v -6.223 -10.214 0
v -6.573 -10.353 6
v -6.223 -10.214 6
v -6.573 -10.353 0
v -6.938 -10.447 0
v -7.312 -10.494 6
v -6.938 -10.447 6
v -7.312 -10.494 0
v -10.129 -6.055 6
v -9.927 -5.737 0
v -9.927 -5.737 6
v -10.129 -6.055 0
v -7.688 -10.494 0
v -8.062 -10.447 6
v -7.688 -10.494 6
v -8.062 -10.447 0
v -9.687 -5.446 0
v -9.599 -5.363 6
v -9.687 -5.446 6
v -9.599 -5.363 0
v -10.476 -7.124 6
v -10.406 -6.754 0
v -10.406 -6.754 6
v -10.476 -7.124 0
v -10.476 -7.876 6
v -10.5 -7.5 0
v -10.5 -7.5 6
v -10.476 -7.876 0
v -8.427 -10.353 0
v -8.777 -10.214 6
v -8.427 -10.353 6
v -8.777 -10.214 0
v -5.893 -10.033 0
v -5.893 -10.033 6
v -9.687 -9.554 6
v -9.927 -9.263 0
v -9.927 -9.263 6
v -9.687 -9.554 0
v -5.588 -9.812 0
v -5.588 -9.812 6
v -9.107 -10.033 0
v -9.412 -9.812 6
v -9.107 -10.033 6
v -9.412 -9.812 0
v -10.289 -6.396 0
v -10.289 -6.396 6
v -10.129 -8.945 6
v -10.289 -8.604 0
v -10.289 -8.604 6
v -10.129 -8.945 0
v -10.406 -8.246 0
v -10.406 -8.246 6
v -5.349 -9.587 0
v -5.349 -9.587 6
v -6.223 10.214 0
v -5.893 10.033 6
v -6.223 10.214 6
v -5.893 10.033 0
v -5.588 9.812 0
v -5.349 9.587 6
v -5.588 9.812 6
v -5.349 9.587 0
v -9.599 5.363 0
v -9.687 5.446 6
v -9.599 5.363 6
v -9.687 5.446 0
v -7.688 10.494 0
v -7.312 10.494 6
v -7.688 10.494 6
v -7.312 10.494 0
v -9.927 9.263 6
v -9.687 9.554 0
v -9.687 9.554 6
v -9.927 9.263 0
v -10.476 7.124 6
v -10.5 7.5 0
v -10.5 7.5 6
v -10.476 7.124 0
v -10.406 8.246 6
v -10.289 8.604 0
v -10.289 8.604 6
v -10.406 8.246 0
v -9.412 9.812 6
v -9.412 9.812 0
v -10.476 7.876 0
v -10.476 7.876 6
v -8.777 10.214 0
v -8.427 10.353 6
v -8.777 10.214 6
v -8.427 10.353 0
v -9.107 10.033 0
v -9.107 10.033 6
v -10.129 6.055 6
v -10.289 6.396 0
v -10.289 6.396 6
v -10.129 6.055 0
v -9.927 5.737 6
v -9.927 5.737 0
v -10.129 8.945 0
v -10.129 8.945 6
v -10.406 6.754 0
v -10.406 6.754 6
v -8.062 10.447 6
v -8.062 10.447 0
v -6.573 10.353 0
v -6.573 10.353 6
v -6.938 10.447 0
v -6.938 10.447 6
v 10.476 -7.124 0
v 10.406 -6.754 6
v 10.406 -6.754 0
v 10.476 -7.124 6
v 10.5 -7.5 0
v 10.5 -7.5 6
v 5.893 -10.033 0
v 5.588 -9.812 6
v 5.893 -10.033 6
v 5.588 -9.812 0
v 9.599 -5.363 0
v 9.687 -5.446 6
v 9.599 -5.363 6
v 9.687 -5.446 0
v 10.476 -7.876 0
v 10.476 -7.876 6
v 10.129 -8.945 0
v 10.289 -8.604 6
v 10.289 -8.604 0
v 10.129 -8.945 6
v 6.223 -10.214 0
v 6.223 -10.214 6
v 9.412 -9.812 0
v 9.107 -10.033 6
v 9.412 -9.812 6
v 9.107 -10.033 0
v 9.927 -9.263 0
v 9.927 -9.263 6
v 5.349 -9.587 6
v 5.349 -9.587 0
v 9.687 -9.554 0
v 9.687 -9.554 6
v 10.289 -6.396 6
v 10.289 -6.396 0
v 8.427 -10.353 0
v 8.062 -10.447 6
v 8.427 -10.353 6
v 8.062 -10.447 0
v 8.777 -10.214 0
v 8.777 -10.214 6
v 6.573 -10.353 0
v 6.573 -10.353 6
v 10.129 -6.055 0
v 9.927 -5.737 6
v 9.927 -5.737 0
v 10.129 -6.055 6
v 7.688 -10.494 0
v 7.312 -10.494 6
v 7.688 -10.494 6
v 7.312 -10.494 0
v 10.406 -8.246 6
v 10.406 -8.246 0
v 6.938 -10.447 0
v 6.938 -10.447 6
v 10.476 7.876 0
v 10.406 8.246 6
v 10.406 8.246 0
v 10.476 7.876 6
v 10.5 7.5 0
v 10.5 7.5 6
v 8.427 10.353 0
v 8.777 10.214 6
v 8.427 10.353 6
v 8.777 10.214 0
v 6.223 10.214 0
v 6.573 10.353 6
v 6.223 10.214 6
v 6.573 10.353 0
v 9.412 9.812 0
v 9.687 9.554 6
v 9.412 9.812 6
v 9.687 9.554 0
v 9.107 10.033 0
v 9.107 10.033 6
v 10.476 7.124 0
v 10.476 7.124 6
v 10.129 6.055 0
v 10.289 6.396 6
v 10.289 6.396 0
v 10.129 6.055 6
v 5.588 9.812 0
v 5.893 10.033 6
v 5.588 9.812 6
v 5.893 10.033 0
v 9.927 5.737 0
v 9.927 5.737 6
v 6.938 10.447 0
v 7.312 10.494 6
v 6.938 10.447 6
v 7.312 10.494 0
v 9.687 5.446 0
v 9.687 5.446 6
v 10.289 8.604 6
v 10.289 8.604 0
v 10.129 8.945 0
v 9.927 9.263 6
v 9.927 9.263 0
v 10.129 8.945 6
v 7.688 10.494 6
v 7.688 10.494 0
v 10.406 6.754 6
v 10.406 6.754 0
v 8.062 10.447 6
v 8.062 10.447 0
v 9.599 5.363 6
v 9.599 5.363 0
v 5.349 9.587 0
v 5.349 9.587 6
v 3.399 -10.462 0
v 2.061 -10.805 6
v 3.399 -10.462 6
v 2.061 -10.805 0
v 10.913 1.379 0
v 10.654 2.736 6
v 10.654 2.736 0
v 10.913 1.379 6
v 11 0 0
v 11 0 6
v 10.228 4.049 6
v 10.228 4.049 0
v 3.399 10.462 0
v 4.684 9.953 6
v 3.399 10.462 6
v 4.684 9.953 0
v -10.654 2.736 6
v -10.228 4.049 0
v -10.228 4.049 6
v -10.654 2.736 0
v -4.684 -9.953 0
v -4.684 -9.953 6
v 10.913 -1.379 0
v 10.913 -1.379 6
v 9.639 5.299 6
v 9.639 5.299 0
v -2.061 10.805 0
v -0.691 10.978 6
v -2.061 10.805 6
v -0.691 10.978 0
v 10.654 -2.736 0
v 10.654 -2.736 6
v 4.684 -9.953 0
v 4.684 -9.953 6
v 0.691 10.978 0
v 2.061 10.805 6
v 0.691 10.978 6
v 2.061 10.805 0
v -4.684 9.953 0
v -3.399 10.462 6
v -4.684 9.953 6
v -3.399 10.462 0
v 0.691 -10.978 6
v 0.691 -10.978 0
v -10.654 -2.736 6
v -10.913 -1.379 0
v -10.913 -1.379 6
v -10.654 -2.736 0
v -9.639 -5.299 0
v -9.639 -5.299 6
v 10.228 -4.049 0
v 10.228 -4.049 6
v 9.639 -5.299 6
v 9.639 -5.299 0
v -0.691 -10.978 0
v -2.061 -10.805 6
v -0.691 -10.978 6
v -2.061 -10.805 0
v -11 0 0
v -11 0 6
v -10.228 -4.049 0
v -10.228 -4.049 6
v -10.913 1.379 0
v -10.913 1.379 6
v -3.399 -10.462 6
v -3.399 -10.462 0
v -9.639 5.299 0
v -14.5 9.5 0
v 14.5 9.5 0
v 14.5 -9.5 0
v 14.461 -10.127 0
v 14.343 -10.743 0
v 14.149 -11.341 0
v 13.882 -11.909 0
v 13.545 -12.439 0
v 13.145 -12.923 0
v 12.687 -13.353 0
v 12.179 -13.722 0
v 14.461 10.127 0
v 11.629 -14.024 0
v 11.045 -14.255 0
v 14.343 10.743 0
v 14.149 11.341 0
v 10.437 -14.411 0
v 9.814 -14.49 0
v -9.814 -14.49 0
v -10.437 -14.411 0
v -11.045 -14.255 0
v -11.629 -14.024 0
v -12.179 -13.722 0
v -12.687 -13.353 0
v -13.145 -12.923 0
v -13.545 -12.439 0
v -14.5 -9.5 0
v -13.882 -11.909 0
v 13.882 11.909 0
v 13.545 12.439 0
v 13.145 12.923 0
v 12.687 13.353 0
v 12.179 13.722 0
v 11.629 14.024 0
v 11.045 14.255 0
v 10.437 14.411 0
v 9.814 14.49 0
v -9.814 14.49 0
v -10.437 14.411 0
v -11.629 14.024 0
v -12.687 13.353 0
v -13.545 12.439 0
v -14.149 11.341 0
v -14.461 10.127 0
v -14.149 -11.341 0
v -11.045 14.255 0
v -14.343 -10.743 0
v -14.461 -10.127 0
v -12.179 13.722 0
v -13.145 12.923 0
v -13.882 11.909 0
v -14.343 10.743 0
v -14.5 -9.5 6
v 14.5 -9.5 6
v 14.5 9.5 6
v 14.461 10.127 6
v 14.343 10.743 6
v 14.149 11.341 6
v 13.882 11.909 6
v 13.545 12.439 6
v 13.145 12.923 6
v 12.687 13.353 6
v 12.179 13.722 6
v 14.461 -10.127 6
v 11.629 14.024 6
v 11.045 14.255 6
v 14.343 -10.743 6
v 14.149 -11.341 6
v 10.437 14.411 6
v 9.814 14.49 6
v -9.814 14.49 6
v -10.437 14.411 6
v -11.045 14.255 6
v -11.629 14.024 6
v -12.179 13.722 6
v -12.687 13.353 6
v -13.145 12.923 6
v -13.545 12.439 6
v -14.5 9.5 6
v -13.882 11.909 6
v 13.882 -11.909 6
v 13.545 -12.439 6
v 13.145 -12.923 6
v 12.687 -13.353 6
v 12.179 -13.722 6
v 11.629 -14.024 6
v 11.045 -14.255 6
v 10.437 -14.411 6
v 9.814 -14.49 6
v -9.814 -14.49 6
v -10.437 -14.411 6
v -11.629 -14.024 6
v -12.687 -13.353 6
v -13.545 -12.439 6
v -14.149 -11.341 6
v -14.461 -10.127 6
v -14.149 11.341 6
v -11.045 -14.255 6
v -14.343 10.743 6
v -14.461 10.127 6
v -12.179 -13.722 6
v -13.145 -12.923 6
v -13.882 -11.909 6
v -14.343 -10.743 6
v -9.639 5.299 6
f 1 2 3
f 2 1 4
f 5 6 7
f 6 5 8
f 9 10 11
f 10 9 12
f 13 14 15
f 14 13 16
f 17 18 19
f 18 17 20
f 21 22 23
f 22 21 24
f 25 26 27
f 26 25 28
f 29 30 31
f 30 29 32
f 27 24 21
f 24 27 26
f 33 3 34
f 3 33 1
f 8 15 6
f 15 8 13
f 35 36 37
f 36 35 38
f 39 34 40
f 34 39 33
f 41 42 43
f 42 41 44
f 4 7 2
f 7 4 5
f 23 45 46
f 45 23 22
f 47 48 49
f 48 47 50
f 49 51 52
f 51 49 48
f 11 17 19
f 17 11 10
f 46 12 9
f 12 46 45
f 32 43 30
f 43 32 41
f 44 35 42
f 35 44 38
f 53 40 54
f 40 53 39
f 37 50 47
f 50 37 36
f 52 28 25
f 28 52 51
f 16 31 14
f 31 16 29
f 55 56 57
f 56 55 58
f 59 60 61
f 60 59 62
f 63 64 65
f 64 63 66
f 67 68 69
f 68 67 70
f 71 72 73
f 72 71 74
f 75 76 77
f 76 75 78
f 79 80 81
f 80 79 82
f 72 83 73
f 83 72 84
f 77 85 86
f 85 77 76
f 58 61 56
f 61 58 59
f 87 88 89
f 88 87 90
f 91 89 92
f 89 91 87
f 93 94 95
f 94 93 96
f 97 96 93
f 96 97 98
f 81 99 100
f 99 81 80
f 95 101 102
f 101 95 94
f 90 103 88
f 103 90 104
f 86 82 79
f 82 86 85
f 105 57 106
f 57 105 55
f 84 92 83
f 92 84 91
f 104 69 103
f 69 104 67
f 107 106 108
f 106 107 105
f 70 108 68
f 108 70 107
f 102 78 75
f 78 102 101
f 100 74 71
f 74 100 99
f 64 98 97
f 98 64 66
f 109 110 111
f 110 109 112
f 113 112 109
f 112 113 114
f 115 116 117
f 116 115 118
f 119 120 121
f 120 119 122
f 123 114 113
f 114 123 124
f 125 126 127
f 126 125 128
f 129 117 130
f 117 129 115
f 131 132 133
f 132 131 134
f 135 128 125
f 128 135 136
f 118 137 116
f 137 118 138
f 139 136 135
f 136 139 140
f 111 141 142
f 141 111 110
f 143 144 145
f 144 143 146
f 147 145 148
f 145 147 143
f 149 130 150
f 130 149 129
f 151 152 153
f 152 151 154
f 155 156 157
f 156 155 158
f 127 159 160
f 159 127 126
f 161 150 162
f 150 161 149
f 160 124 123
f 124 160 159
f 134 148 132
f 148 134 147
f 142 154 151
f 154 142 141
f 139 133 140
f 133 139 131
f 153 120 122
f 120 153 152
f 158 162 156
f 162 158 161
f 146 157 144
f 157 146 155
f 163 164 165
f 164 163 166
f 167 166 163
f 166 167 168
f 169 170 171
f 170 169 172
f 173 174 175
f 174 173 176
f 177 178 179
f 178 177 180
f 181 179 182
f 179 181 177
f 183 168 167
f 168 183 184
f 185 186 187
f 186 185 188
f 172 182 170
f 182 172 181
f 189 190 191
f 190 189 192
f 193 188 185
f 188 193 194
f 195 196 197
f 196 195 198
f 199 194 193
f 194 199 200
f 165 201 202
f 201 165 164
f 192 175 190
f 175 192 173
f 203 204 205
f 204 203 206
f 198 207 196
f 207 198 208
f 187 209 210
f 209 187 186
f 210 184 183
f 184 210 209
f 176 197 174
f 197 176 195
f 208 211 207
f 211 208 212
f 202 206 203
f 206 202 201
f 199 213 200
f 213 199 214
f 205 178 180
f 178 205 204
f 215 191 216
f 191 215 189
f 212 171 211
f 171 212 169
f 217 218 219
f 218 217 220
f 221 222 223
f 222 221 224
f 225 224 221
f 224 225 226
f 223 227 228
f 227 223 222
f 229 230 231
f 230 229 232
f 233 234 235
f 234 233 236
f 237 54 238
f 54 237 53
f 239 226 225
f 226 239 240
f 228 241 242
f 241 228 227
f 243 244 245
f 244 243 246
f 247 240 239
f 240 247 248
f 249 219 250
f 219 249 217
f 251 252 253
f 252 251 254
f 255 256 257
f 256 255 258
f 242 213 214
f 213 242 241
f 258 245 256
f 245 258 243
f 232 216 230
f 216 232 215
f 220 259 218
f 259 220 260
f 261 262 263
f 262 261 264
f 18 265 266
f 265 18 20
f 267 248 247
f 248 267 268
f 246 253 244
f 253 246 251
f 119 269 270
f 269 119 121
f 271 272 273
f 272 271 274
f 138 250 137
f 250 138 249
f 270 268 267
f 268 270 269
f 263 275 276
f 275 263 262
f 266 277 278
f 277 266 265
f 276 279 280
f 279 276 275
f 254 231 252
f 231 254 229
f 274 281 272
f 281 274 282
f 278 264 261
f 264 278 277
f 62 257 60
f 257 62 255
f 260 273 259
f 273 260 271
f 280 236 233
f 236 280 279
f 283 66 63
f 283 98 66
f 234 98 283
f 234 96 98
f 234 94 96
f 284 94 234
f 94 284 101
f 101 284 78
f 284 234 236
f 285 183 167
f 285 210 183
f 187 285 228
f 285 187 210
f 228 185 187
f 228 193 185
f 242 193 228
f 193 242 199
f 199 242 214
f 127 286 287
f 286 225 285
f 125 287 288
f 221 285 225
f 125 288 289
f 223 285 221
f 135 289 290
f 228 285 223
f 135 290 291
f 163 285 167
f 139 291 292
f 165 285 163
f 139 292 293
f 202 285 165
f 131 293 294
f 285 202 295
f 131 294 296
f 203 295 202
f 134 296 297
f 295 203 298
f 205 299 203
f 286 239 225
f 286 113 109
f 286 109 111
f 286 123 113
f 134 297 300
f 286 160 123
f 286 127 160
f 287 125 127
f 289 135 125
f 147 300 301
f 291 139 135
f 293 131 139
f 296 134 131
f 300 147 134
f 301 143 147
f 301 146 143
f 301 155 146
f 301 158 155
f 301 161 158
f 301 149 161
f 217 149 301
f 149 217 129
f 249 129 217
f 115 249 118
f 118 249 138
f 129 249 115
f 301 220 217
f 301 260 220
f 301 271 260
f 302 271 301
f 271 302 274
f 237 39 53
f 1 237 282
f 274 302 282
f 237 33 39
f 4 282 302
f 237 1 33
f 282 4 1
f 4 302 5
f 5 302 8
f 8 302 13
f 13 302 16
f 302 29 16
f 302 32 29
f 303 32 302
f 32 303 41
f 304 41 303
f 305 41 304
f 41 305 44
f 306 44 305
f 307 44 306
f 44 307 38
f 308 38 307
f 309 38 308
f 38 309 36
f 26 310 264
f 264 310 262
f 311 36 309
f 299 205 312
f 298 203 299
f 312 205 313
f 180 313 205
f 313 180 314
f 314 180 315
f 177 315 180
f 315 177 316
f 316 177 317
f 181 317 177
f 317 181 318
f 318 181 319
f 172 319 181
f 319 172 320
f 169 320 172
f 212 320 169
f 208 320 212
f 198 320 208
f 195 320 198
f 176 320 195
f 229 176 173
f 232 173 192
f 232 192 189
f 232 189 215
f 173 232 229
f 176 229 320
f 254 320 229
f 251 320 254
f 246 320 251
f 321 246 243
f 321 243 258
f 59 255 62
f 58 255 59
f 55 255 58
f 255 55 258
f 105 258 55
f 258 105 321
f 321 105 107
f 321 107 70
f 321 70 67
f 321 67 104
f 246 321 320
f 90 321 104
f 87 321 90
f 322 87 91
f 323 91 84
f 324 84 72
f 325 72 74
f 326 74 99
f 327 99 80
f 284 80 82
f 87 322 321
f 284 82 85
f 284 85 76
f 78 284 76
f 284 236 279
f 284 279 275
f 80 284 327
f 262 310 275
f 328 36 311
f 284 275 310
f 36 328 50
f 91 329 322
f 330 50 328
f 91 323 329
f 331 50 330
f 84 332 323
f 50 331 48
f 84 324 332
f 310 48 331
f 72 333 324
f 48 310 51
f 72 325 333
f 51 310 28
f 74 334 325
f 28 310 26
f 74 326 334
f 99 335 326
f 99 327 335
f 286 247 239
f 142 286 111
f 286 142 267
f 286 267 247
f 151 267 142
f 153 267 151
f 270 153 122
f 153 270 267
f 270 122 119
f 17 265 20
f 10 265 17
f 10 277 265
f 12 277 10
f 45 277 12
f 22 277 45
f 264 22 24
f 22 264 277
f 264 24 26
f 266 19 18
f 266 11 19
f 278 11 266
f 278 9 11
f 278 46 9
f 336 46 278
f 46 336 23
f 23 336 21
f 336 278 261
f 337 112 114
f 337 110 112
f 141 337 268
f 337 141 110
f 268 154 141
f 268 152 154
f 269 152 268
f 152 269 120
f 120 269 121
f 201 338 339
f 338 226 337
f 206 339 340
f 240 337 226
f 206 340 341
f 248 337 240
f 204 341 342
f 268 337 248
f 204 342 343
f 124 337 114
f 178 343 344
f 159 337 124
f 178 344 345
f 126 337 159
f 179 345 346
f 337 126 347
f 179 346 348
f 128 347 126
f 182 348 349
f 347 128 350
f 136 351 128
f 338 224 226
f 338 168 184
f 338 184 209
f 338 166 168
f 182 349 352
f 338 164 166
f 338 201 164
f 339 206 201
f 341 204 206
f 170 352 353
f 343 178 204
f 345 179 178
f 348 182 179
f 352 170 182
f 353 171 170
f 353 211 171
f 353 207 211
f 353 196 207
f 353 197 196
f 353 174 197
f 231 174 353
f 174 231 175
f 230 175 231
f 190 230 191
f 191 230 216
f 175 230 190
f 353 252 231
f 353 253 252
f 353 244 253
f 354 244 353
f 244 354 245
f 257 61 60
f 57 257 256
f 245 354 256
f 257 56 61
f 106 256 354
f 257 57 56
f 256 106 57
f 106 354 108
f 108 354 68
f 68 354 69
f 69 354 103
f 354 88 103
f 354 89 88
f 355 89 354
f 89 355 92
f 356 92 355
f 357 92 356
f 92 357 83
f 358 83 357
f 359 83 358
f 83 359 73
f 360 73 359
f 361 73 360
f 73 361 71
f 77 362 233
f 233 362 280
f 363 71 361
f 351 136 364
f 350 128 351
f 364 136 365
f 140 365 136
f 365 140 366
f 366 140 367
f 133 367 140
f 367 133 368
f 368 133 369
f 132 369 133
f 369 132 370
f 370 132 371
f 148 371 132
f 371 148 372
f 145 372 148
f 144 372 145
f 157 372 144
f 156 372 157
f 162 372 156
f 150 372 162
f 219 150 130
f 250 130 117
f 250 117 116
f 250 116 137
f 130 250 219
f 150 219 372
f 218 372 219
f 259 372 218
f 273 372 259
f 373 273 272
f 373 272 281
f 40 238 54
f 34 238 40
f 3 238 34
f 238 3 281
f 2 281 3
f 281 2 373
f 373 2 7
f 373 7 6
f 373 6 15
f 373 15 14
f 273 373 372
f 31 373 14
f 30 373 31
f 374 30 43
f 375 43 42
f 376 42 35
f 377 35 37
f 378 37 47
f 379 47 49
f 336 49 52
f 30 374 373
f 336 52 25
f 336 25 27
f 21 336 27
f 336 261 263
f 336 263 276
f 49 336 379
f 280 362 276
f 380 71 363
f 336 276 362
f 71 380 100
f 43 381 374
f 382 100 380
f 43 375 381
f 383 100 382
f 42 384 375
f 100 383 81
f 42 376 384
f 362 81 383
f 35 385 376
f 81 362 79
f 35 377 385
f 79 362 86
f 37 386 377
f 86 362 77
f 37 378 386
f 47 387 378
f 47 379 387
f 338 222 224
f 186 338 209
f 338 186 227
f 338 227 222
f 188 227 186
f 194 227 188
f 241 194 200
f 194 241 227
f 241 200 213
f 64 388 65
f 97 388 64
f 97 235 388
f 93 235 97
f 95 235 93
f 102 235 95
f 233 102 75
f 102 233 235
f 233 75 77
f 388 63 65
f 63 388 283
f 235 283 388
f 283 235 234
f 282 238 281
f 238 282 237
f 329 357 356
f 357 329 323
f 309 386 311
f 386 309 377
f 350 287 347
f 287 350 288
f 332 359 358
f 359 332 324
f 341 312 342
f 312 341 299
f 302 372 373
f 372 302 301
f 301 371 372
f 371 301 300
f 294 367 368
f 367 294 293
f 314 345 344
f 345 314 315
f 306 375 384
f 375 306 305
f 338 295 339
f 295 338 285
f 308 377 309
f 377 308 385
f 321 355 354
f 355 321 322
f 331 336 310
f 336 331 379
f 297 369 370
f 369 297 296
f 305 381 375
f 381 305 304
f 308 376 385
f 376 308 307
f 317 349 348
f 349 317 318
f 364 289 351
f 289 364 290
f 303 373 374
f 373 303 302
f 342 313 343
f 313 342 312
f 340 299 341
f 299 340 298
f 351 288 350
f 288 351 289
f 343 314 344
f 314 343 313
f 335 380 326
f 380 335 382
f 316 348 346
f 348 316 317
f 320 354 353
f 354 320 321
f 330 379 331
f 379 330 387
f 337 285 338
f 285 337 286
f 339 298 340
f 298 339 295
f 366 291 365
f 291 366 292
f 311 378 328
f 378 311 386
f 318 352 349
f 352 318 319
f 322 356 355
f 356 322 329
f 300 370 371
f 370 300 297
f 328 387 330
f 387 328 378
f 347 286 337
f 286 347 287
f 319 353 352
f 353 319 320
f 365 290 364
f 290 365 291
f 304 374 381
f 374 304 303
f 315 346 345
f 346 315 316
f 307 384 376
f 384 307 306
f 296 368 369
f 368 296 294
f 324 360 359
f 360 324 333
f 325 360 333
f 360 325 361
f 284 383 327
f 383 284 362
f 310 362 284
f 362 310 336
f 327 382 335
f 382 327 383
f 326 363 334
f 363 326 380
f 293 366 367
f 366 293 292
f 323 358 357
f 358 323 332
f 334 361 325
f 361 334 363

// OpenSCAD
$fn = 50;


difference() {
	union() {
		hull() {
			translate(v = [-9.5000000000, 9.5000000000, 0]) {
				cylinder(h = 6, r = 5);
			}
			translate(v = [9.5000000000, 9.5000000000, 0]) {
				cylinder(h = 6, r = 5);
			}
			translate(v = [-9.5000000000, -9.5000000000, 0]) {
				cylinder(h = 6, r = 5);
			}
			translate(v = [9.5000000000, -9.5000000000, 0]) {
				cylinder(h = 6, r = 5);
			}
		}
	}
	union() {
		#translate(v = [-7.5000000000, -7.5000000000, -100.0000000000]) {
			cylinder(h = 200, r = 3.0000000000);
		}
		#translate(v = [-7.5000000000, 7.5000000000, -100.0000000000]) {
			cylinder(h = 200, r = 3.0000000000);
		}
		#translate(v = [7.5000000000, -7.5000000000, -100.0000000000]) {
			cylinder(h = 200, r = 3.0000000000);
		}
		#translate(v = [7.5000000000, 7.5000000000, -100.0000000000]) {
			cylinder(h = 200, r = 3.0000000000);
		}
		#cylinder(h = 6, r = 11.0000000000);
	}
}
